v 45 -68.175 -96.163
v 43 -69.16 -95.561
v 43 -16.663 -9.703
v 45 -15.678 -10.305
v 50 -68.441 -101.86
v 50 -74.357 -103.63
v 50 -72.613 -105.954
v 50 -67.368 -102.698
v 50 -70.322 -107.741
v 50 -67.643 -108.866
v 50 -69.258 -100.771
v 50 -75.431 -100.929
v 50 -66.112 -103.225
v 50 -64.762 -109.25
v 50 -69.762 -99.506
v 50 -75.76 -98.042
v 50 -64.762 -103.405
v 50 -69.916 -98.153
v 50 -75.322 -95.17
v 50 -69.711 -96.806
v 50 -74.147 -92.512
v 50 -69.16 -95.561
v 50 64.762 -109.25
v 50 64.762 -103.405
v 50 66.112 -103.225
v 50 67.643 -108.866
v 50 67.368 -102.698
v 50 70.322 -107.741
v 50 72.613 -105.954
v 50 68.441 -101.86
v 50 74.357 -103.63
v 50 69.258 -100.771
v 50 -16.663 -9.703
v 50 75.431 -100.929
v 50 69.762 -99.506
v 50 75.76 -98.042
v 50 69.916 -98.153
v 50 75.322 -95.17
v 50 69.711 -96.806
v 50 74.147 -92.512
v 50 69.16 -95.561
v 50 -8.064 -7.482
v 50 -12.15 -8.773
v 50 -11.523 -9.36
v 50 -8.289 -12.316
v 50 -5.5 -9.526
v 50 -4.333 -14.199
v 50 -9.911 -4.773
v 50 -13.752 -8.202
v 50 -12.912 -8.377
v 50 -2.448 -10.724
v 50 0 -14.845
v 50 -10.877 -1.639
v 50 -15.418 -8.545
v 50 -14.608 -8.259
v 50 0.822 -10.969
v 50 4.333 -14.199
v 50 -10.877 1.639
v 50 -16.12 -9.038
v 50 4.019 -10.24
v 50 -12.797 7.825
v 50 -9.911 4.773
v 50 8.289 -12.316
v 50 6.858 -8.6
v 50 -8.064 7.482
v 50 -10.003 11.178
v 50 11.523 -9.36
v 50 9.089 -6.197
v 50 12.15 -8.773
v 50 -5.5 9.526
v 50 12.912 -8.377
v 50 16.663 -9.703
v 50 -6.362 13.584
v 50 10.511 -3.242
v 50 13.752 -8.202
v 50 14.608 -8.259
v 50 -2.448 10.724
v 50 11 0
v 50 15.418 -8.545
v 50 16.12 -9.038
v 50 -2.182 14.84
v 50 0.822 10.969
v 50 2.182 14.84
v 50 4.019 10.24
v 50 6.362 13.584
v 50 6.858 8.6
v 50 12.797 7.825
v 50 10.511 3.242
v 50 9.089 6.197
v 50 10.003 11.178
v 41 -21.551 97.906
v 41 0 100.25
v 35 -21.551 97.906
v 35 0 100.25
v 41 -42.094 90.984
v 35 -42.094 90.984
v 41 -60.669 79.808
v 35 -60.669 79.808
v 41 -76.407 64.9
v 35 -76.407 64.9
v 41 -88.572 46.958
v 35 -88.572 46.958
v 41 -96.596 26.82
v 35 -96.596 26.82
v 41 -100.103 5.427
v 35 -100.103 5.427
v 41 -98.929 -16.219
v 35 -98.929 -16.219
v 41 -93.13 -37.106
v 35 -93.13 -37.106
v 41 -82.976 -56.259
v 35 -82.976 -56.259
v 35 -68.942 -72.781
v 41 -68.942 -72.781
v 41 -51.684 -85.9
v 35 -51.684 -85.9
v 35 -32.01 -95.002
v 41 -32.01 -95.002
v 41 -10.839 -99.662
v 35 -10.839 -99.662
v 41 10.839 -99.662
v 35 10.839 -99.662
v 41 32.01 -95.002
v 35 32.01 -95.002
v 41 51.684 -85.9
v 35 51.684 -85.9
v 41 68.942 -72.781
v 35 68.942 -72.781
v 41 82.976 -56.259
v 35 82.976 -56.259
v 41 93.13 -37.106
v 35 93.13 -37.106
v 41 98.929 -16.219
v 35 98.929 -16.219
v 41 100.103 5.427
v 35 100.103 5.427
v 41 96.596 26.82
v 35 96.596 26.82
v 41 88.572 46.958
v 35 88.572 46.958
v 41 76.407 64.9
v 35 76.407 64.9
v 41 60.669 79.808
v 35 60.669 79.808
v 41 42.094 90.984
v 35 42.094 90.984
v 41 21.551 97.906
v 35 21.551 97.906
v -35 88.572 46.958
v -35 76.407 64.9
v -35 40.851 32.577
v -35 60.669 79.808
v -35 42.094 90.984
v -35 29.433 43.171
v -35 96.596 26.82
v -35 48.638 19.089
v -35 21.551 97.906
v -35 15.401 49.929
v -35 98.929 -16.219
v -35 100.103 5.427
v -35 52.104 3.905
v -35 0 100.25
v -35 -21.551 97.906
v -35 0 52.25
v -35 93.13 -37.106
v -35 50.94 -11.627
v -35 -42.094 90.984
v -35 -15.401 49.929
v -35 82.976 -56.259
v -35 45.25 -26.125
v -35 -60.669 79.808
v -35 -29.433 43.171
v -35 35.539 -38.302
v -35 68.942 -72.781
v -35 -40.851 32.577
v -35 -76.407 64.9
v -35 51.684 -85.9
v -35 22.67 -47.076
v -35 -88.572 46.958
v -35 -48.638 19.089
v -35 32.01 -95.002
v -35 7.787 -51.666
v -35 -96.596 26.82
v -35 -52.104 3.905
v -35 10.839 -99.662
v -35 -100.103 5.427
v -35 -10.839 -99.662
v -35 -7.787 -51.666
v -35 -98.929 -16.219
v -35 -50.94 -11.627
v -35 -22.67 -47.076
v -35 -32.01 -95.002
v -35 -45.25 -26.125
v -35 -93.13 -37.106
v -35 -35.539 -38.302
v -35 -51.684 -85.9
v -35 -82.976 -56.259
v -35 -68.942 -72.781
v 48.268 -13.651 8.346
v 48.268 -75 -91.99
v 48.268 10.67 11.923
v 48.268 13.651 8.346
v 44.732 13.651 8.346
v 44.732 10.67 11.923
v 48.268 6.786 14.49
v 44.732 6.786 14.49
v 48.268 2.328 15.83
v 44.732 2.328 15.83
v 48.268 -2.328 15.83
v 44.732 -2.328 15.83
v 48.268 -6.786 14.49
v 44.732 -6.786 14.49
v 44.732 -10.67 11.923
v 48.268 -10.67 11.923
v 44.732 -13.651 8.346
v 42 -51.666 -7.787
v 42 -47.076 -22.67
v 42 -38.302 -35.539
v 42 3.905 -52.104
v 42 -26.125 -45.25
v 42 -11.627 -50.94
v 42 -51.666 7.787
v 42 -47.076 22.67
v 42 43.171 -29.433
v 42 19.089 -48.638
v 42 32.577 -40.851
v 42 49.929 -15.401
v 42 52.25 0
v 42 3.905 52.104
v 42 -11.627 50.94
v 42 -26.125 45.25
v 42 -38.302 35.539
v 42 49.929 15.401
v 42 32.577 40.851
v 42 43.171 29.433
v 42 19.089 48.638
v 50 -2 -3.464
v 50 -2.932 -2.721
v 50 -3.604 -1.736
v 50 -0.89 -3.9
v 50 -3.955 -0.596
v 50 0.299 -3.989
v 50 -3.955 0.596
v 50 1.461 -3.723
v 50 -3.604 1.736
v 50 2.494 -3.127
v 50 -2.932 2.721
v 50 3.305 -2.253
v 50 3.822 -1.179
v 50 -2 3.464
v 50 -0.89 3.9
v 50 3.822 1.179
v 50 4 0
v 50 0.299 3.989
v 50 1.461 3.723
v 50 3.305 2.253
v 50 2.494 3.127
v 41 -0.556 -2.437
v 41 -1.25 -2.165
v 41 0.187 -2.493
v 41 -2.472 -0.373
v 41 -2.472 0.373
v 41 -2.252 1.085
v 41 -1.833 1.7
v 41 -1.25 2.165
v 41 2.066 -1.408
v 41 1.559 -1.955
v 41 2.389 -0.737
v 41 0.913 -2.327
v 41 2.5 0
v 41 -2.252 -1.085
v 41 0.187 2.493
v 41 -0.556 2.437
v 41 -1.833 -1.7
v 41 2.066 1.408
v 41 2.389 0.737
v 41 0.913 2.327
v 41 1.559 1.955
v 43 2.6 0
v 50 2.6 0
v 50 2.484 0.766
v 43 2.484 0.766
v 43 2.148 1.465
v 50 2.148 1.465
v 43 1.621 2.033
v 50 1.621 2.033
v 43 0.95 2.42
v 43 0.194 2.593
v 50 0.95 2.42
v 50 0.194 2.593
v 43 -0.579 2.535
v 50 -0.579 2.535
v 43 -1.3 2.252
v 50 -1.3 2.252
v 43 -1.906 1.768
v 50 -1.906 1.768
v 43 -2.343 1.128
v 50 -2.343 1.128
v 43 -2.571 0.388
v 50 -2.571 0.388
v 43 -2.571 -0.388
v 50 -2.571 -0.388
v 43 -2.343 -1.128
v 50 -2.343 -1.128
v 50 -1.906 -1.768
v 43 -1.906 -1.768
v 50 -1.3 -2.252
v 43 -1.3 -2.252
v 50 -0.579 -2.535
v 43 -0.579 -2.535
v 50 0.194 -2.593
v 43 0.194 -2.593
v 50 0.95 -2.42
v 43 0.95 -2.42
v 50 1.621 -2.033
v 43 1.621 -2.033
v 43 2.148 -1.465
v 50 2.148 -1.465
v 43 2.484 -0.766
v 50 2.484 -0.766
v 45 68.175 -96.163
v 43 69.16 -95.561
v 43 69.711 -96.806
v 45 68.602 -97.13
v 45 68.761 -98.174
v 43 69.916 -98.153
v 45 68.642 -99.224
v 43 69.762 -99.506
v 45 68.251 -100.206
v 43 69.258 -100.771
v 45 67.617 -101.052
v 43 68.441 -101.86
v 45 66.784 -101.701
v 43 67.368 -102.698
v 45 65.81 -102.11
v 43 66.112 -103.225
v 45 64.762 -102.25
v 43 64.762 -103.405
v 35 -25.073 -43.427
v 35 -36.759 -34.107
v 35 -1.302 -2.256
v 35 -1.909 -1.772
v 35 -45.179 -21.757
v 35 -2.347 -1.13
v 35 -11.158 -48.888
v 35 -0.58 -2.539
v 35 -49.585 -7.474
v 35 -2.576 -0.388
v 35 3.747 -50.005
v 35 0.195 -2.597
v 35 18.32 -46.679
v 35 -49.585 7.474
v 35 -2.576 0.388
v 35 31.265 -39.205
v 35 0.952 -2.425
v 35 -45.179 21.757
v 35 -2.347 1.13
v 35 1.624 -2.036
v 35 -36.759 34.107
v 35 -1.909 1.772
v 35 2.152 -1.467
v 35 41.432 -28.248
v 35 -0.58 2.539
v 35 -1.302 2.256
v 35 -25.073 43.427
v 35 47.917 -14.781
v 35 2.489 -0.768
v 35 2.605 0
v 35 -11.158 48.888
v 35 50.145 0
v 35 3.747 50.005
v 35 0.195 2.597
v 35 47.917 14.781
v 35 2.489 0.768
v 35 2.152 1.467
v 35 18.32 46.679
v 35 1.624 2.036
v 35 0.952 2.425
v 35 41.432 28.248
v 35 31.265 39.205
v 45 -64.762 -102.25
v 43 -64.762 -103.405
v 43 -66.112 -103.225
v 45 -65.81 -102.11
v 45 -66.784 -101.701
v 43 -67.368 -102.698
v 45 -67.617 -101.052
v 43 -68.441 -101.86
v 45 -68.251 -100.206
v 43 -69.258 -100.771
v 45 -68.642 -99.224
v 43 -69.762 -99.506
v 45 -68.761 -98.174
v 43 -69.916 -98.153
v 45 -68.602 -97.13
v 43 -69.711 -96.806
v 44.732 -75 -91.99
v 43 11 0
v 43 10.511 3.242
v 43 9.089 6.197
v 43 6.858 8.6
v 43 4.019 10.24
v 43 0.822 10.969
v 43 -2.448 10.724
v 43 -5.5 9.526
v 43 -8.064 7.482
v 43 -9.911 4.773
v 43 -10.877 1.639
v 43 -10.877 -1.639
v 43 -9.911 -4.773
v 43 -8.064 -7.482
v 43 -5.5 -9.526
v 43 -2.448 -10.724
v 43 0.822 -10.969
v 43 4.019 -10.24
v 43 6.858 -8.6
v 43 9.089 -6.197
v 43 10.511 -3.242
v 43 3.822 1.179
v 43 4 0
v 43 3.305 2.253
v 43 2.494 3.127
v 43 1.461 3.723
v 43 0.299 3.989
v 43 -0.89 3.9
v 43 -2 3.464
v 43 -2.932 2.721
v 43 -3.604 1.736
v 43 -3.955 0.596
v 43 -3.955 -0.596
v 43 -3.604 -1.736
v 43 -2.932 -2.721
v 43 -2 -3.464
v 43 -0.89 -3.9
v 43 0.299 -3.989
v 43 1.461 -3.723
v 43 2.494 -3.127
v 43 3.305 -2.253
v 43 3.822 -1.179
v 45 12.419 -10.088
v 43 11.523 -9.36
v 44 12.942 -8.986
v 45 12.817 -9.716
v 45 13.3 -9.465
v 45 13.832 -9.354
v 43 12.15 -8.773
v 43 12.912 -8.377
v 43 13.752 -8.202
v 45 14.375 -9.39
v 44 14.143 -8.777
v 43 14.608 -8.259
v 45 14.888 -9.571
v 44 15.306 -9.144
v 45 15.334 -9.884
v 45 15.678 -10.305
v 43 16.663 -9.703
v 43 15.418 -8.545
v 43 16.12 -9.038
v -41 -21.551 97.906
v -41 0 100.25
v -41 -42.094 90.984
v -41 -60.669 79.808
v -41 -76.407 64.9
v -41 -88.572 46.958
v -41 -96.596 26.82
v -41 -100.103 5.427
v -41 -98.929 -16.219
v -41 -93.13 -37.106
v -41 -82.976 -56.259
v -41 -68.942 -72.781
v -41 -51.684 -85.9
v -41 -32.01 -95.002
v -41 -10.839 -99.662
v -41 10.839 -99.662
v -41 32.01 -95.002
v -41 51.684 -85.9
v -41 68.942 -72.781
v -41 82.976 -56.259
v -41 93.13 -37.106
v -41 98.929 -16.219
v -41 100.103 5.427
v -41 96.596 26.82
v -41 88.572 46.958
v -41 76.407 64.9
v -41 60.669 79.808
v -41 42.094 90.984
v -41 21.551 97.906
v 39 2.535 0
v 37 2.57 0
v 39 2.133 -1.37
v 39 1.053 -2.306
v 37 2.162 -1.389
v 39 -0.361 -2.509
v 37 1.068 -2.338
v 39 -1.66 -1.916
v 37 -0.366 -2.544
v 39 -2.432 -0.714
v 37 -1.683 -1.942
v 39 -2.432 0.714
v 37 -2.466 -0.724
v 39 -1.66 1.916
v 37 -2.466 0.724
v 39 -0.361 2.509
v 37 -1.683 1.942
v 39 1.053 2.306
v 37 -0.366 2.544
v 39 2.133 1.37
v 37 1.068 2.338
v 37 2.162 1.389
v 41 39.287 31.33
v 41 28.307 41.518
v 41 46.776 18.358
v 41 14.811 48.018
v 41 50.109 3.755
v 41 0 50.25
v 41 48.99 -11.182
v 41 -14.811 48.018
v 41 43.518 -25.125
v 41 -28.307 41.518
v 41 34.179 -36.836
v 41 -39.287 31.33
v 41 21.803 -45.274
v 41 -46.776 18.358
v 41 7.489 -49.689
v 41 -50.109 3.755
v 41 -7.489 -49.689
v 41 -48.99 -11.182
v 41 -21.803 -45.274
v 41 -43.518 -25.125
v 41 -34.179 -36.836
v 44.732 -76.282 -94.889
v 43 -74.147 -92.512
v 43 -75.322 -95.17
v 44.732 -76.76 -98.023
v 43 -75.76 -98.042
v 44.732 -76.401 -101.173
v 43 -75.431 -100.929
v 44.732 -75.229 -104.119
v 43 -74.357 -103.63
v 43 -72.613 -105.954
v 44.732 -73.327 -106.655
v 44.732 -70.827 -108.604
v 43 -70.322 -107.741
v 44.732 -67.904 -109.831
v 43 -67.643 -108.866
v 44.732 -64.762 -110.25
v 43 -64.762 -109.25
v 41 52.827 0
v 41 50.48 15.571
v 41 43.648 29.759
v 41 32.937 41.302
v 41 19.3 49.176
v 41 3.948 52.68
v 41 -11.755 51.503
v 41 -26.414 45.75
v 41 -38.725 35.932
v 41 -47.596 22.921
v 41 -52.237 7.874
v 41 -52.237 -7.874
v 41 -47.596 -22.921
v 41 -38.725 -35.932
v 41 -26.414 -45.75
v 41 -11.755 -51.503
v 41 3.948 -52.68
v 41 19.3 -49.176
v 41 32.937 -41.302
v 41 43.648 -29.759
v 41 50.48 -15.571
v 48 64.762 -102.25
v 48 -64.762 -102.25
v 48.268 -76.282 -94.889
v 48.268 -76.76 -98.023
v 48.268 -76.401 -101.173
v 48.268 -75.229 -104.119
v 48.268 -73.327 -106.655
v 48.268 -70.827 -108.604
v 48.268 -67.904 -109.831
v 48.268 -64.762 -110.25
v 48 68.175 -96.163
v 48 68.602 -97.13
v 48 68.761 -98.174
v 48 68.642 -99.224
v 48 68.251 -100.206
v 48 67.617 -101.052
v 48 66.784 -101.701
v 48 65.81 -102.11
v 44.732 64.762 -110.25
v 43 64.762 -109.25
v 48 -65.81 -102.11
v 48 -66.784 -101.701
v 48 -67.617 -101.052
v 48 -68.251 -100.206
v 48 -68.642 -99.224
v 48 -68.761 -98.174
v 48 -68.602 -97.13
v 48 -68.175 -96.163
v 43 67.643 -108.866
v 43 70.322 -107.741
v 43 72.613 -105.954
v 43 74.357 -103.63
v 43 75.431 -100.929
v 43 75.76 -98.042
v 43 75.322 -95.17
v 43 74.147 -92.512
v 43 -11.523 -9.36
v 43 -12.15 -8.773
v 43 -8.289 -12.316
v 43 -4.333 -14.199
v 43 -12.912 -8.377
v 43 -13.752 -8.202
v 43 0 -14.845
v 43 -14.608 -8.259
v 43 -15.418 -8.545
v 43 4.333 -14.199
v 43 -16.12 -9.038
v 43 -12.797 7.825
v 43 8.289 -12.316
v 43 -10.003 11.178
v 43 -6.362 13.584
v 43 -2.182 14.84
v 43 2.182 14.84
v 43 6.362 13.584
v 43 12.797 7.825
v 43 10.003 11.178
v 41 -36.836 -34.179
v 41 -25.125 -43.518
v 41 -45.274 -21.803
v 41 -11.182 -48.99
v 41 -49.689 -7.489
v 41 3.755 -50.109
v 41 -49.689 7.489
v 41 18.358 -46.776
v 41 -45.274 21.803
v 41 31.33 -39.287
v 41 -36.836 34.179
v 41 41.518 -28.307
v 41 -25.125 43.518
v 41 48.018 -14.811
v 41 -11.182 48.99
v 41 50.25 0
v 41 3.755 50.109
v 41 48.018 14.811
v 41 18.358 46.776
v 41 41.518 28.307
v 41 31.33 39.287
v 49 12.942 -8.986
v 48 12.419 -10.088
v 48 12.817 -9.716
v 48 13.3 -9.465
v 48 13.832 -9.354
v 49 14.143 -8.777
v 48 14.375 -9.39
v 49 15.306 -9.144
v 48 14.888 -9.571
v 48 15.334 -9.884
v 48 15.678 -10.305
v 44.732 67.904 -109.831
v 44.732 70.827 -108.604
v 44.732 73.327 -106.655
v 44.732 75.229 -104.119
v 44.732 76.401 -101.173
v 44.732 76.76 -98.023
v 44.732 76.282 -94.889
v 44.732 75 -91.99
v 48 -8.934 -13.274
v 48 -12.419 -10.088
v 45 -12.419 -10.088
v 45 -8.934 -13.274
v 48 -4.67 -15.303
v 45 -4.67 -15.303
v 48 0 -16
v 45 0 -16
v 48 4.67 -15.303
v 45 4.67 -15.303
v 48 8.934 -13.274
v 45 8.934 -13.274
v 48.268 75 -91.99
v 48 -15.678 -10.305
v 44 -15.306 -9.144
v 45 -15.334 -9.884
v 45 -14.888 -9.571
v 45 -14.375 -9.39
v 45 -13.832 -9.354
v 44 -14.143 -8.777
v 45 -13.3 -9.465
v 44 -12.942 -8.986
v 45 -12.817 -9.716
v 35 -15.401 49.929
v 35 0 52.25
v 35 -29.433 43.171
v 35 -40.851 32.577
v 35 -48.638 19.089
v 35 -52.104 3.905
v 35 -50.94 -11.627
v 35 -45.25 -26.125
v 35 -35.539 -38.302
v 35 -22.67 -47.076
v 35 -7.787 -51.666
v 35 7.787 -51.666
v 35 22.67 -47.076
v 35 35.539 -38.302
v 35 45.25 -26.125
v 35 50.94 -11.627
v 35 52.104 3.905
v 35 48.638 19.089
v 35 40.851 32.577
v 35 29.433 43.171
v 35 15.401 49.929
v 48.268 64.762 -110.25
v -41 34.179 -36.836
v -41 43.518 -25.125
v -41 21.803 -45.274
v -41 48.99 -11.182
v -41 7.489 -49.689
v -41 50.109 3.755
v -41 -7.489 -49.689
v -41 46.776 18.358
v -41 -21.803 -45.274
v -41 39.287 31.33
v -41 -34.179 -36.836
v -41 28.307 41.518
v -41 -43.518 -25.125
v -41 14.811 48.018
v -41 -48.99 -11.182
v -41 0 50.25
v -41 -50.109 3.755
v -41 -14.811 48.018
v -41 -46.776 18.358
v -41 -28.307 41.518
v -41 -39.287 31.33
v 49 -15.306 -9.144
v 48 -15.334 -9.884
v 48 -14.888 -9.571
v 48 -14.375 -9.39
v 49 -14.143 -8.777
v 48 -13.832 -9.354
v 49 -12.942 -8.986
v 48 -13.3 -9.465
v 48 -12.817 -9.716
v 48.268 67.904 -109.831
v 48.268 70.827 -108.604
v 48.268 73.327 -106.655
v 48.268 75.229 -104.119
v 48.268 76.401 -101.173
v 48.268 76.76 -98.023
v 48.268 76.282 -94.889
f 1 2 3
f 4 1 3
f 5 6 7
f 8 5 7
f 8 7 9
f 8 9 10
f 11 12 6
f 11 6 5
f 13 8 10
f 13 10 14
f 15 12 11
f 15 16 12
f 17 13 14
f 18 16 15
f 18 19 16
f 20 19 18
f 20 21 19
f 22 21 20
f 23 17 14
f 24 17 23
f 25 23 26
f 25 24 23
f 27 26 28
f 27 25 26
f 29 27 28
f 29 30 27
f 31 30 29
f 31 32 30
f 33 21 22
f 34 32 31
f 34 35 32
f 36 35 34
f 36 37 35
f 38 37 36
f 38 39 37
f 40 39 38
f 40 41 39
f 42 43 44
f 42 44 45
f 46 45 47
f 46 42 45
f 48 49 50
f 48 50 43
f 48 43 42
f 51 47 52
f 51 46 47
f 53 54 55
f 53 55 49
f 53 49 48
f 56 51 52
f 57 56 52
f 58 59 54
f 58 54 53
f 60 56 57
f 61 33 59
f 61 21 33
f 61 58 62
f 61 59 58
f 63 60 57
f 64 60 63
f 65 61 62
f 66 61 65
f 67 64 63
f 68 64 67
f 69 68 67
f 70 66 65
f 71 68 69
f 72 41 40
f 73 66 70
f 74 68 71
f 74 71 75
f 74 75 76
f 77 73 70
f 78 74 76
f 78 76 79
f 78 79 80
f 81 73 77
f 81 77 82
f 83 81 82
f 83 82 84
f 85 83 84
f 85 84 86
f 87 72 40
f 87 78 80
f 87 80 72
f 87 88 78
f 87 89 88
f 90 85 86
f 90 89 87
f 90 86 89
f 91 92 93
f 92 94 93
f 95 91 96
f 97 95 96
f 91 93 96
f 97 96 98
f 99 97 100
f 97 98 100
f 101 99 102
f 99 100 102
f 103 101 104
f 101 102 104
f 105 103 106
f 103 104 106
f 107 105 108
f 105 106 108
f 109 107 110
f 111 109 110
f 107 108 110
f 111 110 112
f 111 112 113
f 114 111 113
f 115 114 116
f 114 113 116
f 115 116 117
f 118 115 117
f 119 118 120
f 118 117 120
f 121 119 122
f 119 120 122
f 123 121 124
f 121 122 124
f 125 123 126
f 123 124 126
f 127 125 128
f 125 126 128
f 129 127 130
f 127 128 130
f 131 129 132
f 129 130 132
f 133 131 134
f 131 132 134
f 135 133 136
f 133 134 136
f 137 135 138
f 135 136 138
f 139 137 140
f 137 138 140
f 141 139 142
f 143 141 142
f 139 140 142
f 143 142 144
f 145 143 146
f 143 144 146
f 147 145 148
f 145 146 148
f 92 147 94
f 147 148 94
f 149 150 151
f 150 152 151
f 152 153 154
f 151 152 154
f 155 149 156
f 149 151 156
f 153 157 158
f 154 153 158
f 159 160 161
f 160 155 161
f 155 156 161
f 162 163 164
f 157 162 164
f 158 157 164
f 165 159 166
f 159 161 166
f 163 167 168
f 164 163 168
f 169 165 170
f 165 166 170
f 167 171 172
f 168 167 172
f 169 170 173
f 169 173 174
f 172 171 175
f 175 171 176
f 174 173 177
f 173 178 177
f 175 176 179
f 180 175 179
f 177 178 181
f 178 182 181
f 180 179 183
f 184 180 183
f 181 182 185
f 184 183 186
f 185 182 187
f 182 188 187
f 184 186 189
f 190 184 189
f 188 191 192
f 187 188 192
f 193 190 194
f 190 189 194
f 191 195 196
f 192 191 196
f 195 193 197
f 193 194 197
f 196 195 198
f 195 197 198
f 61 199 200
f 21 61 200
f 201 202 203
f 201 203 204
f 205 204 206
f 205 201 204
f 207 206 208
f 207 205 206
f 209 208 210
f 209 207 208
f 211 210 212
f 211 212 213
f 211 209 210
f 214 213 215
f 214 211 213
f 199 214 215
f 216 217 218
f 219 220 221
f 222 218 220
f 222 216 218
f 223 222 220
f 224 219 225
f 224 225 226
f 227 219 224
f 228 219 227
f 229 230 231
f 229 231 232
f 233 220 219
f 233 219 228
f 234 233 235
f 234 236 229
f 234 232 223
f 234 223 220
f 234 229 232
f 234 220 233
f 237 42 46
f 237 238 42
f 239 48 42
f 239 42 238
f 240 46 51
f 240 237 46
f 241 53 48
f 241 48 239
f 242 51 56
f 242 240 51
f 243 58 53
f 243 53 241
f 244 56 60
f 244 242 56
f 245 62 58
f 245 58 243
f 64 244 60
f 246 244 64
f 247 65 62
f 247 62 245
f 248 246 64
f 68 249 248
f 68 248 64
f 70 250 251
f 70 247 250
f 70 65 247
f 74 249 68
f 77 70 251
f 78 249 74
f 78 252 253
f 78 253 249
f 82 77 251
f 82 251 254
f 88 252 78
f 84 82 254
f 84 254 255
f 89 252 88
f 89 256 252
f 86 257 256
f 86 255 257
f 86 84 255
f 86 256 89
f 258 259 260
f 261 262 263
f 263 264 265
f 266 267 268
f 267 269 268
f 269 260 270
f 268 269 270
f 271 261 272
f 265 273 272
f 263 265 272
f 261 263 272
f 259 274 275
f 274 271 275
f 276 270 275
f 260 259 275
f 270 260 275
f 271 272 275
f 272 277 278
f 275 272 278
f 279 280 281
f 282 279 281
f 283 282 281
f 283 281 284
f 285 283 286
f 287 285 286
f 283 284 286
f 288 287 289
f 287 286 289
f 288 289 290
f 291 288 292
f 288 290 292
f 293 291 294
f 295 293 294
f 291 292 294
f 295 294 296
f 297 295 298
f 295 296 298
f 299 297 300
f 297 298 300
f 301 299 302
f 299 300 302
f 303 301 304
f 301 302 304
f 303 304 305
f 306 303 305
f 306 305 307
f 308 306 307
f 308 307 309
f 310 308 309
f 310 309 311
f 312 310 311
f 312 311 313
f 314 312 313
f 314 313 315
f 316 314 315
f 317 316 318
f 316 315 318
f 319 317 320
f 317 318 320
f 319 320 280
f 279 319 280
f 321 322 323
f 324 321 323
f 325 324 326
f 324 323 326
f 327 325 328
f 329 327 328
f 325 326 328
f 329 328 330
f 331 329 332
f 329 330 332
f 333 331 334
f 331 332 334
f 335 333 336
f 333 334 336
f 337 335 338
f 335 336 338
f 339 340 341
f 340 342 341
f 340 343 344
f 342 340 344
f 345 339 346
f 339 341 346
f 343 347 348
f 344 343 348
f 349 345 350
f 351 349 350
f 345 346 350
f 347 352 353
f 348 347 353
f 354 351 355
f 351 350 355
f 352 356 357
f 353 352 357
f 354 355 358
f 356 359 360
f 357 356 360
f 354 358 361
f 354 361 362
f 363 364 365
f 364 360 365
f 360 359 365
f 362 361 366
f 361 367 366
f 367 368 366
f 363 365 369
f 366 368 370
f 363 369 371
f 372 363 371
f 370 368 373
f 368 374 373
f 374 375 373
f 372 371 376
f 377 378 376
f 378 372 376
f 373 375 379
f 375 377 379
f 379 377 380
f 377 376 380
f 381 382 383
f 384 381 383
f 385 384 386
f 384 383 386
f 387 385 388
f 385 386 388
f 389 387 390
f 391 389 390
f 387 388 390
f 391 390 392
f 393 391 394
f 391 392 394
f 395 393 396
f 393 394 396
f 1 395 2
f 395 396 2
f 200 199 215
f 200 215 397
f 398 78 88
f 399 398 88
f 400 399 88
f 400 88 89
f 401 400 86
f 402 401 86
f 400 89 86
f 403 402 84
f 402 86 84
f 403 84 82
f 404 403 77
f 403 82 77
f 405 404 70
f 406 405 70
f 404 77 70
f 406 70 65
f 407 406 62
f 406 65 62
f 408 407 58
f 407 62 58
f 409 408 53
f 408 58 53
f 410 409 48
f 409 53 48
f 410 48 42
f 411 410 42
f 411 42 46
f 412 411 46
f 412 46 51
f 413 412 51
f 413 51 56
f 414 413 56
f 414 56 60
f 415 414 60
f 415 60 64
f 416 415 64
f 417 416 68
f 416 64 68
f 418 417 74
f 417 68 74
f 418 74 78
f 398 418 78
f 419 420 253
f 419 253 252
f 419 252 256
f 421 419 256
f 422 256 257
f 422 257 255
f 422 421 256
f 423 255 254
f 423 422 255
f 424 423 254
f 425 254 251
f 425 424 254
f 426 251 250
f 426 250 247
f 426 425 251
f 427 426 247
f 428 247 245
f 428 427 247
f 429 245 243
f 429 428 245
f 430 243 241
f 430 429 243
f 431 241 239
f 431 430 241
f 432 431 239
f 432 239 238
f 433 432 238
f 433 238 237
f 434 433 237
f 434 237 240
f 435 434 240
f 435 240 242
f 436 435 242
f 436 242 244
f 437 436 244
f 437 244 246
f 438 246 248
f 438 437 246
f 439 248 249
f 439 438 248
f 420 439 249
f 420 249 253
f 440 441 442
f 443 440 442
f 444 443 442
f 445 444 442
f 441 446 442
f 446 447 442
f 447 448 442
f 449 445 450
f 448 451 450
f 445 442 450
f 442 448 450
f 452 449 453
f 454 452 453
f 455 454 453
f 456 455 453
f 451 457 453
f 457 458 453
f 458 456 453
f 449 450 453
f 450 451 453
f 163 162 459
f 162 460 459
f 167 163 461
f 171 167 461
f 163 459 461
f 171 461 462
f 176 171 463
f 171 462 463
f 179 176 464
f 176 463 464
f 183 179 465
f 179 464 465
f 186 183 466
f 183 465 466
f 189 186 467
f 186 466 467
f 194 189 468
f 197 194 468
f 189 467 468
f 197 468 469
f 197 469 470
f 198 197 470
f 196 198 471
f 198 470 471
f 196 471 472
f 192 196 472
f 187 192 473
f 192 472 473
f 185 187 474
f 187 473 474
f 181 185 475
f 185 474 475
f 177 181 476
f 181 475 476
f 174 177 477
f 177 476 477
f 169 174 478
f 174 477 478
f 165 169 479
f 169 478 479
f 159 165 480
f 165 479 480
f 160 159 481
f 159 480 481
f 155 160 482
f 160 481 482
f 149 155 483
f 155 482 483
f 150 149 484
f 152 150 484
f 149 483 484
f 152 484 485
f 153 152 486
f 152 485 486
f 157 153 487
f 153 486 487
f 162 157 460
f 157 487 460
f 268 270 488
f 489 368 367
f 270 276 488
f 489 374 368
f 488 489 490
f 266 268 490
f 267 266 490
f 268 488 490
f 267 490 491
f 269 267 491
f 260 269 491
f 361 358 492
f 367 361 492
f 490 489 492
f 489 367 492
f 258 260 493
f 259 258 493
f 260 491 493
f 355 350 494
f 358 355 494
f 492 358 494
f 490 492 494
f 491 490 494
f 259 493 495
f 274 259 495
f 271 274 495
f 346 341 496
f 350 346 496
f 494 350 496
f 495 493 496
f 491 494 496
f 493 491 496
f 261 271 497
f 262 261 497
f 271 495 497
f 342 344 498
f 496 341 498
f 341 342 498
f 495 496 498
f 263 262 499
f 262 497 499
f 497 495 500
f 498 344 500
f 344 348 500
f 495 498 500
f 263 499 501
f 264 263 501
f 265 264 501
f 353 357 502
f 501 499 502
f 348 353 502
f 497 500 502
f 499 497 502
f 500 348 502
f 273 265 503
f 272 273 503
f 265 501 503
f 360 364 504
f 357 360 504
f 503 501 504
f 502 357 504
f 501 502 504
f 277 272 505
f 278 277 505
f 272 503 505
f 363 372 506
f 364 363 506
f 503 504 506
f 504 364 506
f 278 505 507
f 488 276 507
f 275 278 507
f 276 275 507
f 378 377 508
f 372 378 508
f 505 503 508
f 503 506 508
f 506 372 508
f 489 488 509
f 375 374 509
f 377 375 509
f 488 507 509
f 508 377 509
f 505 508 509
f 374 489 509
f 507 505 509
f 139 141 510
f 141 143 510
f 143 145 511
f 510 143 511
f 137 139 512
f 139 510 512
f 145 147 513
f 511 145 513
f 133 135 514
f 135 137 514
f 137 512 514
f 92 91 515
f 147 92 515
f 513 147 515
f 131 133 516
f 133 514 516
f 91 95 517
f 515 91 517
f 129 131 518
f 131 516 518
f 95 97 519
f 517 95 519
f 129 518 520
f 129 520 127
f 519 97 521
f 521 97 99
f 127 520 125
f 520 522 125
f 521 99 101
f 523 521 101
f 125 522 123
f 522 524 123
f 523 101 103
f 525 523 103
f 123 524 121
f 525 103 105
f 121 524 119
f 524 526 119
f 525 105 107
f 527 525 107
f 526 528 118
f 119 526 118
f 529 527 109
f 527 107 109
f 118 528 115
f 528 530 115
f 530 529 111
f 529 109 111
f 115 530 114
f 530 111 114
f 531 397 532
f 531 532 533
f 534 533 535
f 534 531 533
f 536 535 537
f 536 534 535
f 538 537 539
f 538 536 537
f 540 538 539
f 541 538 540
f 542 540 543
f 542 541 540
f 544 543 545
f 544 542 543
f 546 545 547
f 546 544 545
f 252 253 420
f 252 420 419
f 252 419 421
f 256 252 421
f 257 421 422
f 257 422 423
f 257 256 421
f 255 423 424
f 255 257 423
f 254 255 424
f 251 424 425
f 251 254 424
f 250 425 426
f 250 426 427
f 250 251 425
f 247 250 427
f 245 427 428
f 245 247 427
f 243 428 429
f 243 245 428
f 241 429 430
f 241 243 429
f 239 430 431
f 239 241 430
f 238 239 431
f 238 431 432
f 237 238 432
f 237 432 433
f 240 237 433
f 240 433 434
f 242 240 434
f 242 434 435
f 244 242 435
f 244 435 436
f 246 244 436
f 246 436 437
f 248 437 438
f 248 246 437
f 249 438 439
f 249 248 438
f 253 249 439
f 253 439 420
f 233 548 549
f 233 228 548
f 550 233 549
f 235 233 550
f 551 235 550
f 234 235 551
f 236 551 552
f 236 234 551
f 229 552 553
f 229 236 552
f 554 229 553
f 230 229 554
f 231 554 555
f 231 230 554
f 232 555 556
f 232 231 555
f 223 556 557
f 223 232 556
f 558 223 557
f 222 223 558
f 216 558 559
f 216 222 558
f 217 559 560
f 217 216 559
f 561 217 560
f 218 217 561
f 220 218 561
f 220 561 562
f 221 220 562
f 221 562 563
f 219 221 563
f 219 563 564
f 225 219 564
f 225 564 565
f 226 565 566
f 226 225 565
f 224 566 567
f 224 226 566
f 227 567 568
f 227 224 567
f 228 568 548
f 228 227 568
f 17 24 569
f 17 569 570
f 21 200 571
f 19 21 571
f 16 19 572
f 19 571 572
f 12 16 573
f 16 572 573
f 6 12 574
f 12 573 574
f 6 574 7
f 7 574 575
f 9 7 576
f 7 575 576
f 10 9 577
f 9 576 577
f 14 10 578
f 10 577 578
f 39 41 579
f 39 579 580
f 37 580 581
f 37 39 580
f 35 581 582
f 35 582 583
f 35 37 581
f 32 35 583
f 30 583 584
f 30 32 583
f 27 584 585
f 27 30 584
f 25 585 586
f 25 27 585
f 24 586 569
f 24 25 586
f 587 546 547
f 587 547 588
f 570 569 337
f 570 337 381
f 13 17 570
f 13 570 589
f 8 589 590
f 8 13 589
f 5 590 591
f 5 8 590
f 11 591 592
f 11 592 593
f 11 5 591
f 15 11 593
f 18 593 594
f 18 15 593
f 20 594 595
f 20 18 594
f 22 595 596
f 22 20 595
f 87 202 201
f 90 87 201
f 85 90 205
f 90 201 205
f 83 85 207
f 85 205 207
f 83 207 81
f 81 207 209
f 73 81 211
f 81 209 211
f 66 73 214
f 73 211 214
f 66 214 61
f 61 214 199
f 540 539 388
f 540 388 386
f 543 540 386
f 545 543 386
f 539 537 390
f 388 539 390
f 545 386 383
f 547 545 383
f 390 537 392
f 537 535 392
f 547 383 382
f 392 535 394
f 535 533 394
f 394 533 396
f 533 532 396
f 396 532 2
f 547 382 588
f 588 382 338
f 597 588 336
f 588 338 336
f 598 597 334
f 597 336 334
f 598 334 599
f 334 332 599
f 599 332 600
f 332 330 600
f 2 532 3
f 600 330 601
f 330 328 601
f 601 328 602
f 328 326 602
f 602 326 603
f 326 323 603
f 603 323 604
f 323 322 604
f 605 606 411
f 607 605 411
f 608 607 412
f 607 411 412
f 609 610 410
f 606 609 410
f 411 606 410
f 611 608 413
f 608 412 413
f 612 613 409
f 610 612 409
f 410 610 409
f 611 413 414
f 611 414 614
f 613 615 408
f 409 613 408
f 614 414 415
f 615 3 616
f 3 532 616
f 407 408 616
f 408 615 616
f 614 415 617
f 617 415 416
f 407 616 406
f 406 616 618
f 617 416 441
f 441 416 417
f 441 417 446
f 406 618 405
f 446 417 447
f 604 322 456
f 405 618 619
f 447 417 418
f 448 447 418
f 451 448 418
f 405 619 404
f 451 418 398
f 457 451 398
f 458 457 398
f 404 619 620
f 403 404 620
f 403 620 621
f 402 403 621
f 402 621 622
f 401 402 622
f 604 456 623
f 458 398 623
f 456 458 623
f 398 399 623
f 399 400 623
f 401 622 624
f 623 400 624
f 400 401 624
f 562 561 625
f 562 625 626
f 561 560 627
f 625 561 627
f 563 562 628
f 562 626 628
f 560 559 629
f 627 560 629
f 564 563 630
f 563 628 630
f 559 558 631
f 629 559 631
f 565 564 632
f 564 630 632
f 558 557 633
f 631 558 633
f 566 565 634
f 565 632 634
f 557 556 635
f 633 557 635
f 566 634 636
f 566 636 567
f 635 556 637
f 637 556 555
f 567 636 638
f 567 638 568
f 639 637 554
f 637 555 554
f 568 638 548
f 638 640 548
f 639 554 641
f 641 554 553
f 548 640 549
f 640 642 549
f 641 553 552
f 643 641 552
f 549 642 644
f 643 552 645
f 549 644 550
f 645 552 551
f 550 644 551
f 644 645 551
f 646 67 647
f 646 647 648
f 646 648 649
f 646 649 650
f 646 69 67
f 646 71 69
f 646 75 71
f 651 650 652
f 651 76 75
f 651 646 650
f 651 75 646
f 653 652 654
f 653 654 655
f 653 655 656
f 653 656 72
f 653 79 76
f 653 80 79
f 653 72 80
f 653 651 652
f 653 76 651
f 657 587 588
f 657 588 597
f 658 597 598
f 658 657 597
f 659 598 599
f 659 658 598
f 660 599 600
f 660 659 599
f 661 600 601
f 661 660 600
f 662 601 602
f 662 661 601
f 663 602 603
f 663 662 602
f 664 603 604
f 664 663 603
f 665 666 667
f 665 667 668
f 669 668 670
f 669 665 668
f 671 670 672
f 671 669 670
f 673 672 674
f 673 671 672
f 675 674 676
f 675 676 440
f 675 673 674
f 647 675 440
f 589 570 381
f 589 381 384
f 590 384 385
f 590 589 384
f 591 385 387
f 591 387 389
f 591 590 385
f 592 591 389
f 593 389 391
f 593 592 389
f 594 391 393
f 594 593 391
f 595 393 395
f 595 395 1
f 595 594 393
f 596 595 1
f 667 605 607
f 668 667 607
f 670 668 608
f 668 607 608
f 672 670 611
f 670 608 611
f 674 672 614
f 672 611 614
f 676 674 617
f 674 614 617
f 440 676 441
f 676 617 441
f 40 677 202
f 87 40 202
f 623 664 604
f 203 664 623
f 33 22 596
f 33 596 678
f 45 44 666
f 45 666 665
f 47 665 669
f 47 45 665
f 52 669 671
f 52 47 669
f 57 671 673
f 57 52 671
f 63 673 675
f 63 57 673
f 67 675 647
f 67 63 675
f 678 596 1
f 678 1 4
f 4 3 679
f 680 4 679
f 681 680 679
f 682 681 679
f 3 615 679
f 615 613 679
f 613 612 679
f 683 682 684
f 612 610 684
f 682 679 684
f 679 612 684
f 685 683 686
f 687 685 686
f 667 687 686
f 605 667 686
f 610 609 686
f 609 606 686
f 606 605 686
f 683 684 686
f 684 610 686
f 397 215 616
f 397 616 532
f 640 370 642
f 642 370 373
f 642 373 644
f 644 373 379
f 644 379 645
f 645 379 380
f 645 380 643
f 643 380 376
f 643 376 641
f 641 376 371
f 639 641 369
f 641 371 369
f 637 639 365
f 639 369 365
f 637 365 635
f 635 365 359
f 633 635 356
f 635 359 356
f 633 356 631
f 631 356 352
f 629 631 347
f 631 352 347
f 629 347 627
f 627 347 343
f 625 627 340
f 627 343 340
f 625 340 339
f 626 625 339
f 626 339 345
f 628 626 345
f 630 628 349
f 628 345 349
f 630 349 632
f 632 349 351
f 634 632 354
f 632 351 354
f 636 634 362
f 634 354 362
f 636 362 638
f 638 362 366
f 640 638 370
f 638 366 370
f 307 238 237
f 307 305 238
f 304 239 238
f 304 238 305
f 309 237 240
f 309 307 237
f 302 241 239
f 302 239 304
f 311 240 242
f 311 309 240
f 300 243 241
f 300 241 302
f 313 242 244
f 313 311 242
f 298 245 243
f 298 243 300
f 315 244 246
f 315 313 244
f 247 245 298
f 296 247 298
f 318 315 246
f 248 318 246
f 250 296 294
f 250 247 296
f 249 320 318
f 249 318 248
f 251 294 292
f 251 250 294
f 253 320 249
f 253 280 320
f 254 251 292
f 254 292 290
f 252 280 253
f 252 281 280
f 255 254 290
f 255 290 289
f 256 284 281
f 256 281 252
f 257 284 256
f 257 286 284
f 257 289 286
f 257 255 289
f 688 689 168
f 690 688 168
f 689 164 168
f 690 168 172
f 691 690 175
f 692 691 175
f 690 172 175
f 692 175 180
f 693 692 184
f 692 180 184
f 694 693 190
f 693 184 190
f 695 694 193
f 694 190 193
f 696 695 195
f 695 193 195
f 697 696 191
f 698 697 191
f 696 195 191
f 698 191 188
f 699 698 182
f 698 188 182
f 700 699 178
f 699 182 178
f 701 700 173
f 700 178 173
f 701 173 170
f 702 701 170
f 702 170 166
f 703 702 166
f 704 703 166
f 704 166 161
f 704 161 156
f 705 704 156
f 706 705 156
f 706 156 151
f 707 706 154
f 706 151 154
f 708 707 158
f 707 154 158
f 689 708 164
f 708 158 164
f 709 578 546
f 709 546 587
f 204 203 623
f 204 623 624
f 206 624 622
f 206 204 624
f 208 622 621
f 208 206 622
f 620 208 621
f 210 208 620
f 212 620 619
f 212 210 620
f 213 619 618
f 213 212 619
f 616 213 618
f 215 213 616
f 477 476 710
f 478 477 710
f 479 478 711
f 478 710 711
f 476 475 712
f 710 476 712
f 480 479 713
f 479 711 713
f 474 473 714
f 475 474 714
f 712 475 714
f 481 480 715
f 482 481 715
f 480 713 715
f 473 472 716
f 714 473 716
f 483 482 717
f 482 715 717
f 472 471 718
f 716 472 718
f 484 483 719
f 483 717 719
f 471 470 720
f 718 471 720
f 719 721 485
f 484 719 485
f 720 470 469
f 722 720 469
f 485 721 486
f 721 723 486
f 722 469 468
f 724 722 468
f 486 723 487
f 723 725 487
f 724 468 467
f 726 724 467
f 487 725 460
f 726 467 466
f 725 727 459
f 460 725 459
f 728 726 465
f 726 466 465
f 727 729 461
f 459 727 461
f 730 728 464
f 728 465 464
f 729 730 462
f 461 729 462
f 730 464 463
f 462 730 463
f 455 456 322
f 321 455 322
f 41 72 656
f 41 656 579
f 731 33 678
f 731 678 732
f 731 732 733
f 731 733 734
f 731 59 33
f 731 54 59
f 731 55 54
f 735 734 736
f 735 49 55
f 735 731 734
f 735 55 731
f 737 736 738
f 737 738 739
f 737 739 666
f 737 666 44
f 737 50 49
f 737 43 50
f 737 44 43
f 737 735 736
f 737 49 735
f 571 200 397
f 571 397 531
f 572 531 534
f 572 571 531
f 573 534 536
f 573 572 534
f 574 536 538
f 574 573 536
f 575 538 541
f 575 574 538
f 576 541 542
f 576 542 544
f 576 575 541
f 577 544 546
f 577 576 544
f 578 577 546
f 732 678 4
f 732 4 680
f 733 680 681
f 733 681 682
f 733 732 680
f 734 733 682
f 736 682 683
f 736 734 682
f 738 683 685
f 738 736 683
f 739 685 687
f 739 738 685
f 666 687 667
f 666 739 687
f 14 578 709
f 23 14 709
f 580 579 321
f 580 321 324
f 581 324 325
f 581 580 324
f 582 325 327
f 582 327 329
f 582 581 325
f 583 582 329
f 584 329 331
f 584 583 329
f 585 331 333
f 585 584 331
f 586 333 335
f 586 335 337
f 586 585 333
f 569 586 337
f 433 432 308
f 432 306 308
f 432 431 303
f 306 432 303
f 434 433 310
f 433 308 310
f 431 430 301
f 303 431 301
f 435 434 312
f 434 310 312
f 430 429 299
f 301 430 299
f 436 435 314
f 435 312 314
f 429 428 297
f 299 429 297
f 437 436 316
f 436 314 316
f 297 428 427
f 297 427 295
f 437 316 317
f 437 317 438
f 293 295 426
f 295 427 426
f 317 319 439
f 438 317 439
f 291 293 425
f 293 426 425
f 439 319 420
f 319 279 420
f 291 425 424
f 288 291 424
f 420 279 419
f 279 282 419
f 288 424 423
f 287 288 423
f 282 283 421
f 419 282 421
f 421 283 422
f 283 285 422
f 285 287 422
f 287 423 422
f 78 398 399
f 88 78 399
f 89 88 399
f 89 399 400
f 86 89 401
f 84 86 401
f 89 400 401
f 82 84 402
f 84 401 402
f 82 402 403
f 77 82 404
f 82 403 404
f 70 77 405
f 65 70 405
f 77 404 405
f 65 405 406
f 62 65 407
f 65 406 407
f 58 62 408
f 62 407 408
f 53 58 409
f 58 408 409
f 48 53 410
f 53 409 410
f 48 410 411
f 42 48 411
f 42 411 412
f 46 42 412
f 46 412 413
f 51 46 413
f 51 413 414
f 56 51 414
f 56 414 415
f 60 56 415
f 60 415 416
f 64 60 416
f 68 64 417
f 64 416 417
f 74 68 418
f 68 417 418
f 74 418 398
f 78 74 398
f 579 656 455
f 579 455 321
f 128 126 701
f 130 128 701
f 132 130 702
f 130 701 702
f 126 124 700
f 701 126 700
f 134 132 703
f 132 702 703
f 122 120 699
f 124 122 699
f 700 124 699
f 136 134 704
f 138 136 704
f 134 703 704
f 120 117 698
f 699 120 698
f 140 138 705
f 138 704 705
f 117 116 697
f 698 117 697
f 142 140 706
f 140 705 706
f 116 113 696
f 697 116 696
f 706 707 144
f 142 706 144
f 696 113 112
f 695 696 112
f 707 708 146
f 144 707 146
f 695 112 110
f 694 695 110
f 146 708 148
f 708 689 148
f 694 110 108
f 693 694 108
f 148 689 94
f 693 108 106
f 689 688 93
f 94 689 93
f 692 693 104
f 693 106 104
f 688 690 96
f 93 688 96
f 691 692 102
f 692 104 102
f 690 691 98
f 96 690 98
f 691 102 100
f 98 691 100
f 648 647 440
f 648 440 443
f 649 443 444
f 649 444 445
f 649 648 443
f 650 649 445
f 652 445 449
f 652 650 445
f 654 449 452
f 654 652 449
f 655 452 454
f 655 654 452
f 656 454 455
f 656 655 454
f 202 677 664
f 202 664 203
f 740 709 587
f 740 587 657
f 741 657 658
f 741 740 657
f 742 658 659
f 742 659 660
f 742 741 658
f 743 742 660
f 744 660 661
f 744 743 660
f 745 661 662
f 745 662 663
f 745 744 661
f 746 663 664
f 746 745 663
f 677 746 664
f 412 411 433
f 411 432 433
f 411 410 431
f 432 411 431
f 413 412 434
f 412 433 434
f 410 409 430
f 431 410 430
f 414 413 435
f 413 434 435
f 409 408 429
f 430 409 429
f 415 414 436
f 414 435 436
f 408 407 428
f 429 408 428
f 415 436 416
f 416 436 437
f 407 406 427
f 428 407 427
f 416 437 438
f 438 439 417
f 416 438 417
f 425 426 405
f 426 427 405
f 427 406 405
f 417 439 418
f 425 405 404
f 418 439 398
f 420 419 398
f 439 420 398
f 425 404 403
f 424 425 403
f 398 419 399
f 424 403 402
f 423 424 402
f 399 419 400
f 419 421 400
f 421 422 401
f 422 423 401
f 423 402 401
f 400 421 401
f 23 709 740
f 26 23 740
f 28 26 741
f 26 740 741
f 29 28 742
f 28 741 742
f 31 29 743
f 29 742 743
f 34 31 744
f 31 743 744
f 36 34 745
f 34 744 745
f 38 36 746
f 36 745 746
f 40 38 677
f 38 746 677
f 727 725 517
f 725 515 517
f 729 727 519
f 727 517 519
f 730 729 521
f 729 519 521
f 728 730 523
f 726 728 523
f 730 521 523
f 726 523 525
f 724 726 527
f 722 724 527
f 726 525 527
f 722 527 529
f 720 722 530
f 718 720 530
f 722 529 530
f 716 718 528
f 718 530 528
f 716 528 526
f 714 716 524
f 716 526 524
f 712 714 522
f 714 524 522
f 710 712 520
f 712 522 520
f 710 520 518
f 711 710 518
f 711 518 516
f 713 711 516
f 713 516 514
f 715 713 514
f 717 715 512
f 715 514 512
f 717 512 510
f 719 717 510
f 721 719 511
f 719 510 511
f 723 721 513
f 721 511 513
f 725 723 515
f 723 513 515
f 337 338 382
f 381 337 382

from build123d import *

# Parameters (mm, degrees)
F3_START    = 2
F2_R        = 11
F2_R_2      = 4
F3_DEPTH    = 7
F4_R        = 50.25
F4_R_2      = 2.5
F5_DEPTH    = 6
F5_TAPER    = 1
F6_R        = 53.25
F7_DEPTH    = 1
F8_R        = 4
F8_R_2      = 2.6
F9_DEPTH    = 7
F10_R       = 11
F11_DEPTH   = 7
F13_SIZE2   = 1.1547005384
F13_SIZE    = 2
F14_SIZE2   = 1.7320508076
F14_SIZE    = 1
F14_2_SIZE2 = 1.7320508076
F14_2_SIZE  = 1


# Not quite as in the source:
# - a fillet or chamfer that OpenCascade refuses, or shapes differently, is made with other operations: its cross-section is extruded or revolved along the edge and cut away or added


with BuildPart() as f1:
    # F0 (on Front) → F1 (revolve)
    with BuildSketch(Plane.XZ):
        Polygon((-41, 100.25), (-41, 50.25), (41, 50.25), (41, 100.25), (35, 100.25), (35, 52.25), (-35, 52.25), (-35, 100.25), align=None)
    revolve(axis=Axis((-0.494361277, 0, 0), (1, 0, 0)))


with BuildPart() as f3:
    # F2 (on face) → F3 (new body)
    with BuildSketch(Plane.YZ.offset(41).offset(F3_START)):
        Circle(F2_R)
        Circle(F2_R_2, mode=Mode.SUBTRACT)
    extrude(amount=F3_DEPTH)


with BuildPart() as f5:
    # F4 (on face) → F5 (new body)
    with BuildSketch(Plane.YZ.offset(41)):
        Circle(F4_R)
        Circle(F4_R_2, mode=Mode.SUBTRACT)
    extrude(amount=-F5_DEPTH, taper=F5_TAPER)

    # F6 (on face) → F7 (join)
    with BuildSketch(Plane.YZ.offset(41)):
        Circle(F6_R)
    extrude(amount=F7_DEPTH)

    # F12: chamfer of 1 x 1.7320508076 on 1 edges, made by hand

    # F12_s1 → F12_t2 (revolve, cut)
    with BuildSketch(Plane.XY):
        Polygon((40.2679491924, 53.25), (42, 52.25), (42, 53.25), align=None)
    revolve(axis=Axis((42, 0, 0), (1, 0, 0)), mode=Mode.SUBTRACT)


with BuildPart() as f9:
    # F8 (on face) → F9 (new body, through all)
    with BuildSketch(Plane.YZ.offset(50)):
        Circle(F8_R)
        Circle(F8_R_2, mode=Mode.SUBTRACT)
    extrude(amount=-F9_DEPTH)


with BuildPart() as f11:
    # F10 (on face) → F11 (new body, through all)
    with BuildSketch(Plane.YZ.offset(50)):
        with BuildLine():
            Line((-13.6505324657, 8.3464341728), (-75, -91.9901743704))
            ThreePointArc((-75, -91.9901743704), (-75.2291419603, -104.1186494377), (-64.7621006507, -110.25))
            Line((-64.7621006507, -110.25), (64.7621006507, -110.25))
            ThreePointArc((64.7621006507, -110.25), (75.2291419603, -104.1186494377), (75, -91.9901743704))
            Line((75, -91.9901743704), (13.6505324657, 8.3464341728))
            ThreePointArc((13.6505324657, 8.3464341728), (0, 16), (-13.6505324657, 8.3464341728))
        make_face()
        with BuildLine():
            ThreePointArc((-64.7621006507, -102.25), (-68.2511144206, -100.2062164792), (-68.1747337671, -96.1633914568))
            Line((-68.1747337671, -96.1633914568), (-15.6779965364, -10.3053590236))
            ThreePointArc((-15.6779965364, -10.3053590236), (-14.1049679318, -9.3531096574), (-12.4192710917, -10.0877007068))
            ThreePointArc((-12.4192710917, -10.0877007068), (0, -16), (12.4192710917, -10.0877007068))
            ThreePointArc((12.4192710917, -10.0877007068), (14.1049679318, -9.3531096574), (15.6779965364, -10.3053590236))
            Line((15.6779965364, -10.3053590236), (68.1747337671, -96.1633914568))
            ThreePointArc((68.1747337671, -96.1633914568), (68.2511144206, -100.2062164792), (64.7621006507, -102.25))
            Line((64.7621006507, -102.25), (-64.7621006507, -102.25))
        make_face(mode=Mode.SUBTRACT)
        Circle(F10_R, mode=Mode.SUBTRACT)
    extrude(amount=-F11_DEPTH)

    # F13
    f13_edges = [f11.edges().sort_by_distance(p)[0] for p in [
        (50, 0, -102.25),
        (43, 0, -102.25),
    ]]
    f13_side = f11.faces().sort_by_distance((46.5, 0, -102.25))[0]
    chamfer(f13_edges, length=F13_SIZE, length2=F13_SIZE2, reference=f13_side)

    # F14
    f14_edges = [f11.edges().sort_by_distance(p)[0] for p in [
        (50, 0, -110.25),
    ]]
    f14_side = f11.faces().sort_by_distance((50, 0, -105.392381))[0]
    chamfer(f14_edges, length=F14_SIZE, length2=F14_SIZE2, reference=f14_side)

    # F14#2
    f14_2_edges = [f11.edges().sort_by_distance(p)[0] for p in [
        (43, 0, -110.25),
    ]]
    f14_2_side = f11.faces().sort_by_distance((43, 0, -105.392381))[0]
    chamfer(f14_2_edges, length=F14_2_SIZE, length2=F14_2_SIZE2, reference=f14_2_side)


solid = Compound([f1.part, f3.part, f5.part, f9.part, f11.part])
